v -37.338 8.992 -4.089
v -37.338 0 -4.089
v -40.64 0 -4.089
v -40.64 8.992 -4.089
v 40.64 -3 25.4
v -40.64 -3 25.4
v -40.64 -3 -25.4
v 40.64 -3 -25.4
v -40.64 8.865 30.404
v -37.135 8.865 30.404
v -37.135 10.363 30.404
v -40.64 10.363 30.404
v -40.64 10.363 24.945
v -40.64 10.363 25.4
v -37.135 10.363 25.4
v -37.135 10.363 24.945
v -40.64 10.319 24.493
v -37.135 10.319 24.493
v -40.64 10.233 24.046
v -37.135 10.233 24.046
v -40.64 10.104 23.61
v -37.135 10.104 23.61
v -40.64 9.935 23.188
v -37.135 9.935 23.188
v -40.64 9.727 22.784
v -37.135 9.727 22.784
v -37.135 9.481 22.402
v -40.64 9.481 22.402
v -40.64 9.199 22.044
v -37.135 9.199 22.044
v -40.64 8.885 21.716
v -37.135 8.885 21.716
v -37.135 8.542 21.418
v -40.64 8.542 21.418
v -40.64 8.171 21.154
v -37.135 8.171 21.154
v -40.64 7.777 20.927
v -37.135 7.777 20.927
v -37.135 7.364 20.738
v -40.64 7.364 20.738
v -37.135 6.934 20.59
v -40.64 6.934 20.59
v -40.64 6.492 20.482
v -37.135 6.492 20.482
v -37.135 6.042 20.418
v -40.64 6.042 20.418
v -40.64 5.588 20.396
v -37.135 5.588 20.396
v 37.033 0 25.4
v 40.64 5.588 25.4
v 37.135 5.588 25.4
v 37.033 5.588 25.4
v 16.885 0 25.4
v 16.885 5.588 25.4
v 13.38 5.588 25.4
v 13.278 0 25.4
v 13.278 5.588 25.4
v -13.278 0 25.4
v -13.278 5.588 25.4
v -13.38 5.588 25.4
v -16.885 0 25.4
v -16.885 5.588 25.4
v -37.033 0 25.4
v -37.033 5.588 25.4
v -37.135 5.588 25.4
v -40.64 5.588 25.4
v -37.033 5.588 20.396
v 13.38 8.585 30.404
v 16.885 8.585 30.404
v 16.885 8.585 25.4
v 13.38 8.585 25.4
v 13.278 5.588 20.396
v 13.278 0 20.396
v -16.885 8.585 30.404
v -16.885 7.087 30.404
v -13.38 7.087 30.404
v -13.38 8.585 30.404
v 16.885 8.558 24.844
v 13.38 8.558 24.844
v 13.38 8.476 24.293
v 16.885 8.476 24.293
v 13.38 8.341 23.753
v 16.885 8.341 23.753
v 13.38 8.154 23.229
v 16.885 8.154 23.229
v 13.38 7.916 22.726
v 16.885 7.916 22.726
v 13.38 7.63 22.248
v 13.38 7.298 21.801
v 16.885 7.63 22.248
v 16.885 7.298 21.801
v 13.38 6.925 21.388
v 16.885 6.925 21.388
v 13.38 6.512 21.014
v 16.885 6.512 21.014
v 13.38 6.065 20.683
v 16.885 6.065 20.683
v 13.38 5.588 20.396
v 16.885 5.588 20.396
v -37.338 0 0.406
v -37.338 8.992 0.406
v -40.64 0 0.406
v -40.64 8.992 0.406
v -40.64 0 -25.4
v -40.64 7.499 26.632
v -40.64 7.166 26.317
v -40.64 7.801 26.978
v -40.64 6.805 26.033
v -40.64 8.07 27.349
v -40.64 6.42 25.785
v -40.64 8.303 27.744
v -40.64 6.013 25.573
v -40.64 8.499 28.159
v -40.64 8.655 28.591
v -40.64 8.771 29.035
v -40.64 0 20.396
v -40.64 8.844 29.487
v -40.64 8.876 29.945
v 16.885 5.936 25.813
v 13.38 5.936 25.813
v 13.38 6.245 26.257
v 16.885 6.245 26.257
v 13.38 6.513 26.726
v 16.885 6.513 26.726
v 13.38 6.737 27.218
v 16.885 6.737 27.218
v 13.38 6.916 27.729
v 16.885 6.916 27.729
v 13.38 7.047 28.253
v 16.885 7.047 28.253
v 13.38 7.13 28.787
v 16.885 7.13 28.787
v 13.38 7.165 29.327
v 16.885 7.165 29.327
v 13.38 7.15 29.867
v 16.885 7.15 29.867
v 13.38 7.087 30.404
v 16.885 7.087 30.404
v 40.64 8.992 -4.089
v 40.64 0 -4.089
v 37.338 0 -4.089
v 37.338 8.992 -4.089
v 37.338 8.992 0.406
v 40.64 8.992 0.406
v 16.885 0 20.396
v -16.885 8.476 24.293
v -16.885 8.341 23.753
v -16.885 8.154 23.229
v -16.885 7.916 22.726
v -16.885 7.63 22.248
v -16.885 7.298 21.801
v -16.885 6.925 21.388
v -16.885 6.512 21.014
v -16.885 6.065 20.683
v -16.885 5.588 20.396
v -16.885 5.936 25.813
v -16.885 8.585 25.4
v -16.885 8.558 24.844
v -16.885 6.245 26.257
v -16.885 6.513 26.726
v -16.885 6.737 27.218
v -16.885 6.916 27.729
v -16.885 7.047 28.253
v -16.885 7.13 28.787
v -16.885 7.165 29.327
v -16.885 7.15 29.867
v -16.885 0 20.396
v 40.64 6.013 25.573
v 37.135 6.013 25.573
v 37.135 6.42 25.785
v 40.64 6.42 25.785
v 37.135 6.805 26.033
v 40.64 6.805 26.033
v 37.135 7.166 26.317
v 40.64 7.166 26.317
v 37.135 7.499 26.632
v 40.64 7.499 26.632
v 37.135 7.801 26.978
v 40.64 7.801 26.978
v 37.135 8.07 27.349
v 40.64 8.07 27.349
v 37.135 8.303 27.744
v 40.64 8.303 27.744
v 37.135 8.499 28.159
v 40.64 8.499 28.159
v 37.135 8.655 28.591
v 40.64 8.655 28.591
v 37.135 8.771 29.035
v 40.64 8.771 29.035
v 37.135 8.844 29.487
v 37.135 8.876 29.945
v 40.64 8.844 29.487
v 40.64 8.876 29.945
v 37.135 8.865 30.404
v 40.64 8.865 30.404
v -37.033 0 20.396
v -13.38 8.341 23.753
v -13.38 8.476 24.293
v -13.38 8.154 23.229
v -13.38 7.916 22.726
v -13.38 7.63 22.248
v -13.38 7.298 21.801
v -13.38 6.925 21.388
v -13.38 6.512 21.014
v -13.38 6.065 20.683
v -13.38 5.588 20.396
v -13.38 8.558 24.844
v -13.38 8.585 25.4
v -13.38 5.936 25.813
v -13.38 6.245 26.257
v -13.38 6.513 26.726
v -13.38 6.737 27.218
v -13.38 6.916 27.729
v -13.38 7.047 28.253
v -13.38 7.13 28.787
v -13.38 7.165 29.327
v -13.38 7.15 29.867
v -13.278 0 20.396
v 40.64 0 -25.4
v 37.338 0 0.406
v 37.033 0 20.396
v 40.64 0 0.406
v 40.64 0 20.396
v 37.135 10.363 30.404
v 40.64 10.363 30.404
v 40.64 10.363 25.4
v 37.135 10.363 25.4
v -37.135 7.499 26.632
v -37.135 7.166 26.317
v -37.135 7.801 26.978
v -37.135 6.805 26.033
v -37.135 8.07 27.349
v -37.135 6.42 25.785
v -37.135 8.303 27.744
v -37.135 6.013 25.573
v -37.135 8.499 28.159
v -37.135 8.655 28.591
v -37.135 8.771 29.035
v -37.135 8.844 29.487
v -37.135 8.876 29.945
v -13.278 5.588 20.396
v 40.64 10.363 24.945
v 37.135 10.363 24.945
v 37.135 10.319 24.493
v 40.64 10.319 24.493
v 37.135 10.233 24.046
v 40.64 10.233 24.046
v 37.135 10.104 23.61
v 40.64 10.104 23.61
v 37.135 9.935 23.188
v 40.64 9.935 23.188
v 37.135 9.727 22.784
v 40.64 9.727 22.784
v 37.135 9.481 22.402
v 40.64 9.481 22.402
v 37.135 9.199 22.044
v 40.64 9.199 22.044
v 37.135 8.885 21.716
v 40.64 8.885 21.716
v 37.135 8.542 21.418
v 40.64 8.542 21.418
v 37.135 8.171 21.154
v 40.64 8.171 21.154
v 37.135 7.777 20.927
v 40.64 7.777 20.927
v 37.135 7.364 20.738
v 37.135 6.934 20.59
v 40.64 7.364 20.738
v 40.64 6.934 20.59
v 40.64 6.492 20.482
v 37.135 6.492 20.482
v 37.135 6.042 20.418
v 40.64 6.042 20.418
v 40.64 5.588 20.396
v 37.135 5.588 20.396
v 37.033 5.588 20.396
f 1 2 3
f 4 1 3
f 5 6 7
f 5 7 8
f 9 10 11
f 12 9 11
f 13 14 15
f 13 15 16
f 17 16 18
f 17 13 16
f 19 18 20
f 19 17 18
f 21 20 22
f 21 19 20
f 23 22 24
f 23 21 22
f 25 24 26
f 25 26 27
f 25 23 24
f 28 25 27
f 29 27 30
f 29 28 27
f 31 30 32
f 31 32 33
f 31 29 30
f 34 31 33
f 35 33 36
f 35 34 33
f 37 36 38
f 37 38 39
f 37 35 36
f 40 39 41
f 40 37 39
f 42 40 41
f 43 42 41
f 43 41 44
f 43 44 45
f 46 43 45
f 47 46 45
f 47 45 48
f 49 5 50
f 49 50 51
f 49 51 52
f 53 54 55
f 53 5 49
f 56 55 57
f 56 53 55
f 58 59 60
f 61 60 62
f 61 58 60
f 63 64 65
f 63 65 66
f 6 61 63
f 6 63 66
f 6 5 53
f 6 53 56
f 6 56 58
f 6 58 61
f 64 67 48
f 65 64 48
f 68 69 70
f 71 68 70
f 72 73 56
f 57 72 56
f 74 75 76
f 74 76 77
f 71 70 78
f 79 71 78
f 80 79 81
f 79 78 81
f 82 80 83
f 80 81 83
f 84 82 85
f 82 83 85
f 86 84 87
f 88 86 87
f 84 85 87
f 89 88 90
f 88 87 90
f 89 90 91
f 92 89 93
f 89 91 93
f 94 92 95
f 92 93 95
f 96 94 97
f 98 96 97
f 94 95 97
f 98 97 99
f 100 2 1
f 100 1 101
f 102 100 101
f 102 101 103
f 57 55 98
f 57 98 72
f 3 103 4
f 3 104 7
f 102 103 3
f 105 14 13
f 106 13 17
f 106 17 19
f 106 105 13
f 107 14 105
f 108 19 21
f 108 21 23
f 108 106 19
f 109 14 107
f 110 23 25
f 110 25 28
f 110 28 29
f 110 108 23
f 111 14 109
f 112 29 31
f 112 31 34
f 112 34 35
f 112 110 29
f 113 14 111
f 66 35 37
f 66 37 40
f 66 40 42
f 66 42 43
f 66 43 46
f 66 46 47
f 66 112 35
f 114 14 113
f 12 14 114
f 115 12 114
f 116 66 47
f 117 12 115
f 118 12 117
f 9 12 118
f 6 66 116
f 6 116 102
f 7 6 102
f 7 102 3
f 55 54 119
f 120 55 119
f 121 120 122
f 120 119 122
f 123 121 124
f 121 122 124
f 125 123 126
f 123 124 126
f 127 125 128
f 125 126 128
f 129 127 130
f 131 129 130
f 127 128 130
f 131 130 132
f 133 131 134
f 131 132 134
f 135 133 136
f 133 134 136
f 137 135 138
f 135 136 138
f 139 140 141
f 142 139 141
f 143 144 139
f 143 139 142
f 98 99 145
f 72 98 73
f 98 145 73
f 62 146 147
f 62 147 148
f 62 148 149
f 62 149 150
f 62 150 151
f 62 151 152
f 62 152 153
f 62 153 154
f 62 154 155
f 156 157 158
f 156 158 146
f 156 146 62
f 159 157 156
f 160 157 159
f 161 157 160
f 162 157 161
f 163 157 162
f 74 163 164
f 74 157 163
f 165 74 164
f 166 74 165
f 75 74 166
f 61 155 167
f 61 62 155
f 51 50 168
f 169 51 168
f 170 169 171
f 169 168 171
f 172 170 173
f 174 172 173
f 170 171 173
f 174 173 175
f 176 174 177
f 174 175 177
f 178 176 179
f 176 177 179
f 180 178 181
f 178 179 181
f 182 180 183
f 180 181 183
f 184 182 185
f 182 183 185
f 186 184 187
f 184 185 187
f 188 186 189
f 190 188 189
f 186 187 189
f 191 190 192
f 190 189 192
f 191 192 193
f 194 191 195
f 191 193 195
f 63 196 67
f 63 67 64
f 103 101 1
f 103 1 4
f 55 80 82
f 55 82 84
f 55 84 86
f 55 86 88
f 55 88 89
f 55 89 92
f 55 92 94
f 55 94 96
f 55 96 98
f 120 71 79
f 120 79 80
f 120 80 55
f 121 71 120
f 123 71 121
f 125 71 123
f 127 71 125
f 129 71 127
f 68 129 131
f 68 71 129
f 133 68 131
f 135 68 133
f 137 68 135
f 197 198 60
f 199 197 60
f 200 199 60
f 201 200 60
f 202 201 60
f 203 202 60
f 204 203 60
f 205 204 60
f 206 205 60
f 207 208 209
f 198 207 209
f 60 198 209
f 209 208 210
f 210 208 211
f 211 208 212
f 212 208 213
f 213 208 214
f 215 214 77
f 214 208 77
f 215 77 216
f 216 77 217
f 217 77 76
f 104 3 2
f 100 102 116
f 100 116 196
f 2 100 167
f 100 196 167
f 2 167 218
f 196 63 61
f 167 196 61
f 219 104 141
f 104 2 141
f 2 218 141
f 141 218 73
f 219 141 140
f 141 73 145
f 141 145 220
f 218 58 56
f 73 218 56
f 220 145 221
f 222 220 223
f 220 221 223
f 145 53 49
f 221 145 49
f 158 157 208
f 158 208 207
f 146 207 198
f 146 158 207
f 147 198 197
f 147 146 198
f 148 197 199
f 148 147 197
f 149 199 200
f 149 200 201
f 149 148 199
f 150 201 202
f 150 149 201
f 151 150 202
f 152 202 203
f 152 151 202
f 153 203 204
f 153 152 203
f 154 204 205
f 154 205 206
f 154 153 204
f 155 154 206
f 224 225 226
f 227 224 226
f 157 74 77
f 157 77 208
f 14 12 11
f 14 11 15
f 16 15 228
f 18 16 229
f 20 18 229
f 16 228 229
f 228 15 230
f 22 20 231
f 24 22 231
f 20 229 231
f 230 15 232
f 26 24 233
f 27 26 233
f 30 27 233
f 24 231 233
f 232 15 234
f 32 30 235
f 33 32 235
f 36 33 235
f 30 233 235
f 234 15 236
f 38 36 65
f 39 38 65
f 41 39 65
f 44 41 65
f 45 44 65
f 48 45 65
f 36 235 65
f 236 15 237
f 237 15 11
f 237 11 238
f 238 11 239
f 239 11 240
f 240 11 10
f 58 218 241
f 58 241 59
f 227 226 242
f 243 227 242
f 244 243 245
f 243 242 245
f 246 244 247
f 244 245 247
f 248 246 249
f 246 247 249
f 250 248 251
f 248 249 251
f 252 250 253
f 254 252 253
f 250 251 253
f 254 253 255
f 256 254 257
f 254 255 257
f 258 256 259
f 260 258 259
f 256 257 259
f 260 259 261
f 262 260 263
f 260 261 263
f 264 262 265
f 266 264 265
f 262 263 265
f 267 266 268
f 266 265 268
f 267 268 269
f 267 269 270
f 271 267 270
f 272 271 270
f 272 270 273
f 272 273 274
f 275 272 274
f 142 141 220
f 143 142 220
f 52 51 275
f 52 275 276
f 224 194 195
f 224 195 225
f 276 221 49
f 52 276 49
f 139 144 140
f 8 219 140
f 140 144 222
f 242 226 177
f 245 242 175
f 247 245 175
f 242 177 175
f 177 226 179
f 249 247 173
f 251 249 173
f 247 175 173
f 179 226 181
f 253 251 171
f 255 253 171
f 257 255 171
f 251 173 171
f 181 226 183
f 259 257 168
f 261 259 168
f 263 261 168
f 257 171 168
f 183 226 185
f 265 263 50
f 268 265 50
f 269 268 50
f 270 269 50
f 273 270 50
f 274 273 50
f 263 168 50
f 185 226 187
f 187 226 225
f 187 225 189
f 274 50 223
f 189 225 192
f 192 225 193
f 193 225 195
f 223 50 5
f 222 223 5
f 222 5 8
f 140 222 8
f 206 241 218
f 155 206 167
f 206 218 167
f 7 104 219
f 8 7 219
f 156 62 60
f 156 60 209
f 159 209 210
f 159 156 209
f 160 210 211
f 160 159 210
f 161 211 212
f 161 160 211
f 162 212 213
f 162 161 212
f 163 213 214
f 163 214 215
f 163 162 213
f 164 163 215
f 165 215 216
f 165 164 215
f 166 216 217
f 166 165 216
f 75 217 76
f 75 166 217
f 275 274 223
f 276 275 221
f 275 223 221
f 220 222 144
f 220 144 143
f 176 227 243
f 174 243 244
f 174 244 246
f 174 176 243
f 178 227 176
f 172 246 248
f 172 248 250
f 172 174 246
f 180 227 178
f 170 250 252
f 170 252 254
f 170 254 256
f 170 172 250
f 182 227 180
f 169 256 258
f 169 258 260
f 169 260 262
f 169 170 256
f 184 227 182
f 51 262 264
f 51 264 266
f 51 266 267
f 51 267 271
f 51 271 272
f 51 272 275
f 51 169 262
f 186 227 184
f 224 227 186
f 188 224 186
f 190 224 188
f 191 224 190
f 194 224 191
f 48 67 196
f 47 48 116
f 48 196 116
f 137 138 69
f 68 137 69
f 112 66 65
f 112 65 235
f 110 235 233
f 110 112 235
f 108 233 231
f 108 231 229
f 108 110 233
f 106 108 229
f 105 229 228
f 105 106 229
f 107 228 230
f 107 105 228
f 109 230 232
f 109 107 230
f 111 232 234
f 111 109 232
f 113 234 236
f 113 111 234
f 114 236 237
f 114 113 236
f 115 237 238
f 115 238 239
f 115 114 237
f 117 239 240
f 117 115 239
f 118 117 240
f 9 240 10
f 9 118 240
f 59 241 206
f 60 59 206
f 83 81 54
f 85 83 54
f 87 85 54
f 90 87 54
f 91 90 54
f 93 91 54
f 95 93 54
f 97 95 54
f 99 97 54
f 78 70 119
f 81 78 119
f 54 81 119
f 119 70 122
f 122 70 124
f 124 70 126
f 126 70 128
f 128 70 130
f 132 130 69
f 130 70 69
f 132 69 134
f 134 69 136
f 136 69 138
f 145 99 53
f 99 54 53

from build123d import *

# Parameters (mm, degrees)
F0_W     = 81.28
F0_H     = 50.8
F1_DEPTH = 3
F2_W     = 3.6068
F2_H     = 5.0038
F3_DEPTH = 5.588
F2_W_2   = 3.302
F2_H_2   = 4.4958
F4_DEPTH = 8.9916
F6_DEPTH = 3.5052
F9_DEPTH = 3.5052


with BuildPart() as f1:
    # F0 (on Front) → F1 (new body)
    with BuildSketch(Plane.XZ):
        Rectangle(F0_W, F0_H)
    extrude(amount=F1_DEPTH)

    # F2 (on face) → F3 (join)
    with BuildSketch(Plane(origin=(0, 0, 0), x_dir=(-1, 0, 0), z_dir=(0, 1, 0))):
        with Locations((38.8366, 22.8981)):
            Rectangle(F2_W, F2_H)
        with Locations((-38.8366, 22.8981)):
            Rectangle(F2_W, F2_H)
        with Locations((-15.0818, 22.8981)):
            Rectangle(F2_W, F2_H)
        with Locations((15.0818, 22.8981)):
            Rectangle(F2_W, F2_H)
    extrude(amount=F3_DEPTH)

    # F2 (on face) → F4 (join)
    with BuildSketch(Plane(origin=(0, 0, 0), x_dir=(-1, 0, 0), z_dir=(0, 1, 0))):
        with Locations((-38.989, -1.8415)):
            Rectangle(F2_W_2, F2_H_2)
        with Locations((38.989, -1.8415)):
            Rectangle(F2_W_2, F2_H_2)
    extrude(amount=F4_DEPTH)

    # F5 (on face) → F6 (join)
    with BuildSketch(Plane(origin=(-40.64, 0, 0), x_dir=(0, -1, 0), z_dir=(-1, 0, 0))):
        with BuildLine():
            Line((-10.3632, 30.4038), (-10.3632, 25.4))
            ThreePointArc((-10.3632, 25.4), (-9.046343, 21.876274), (-5.588, 20.3962))
            Line((-5.588, 20.3962), (-5.588, 25.4))
            ThreePointArc((-5.588, 25.4), (-8.070259, 27.349257), (-8.8646, 30.4038))
            Line((-8.8646, 30.4038), (-10.3632, 30.4038))
        make_face()
    extrude(amount=-F6_DEPTH)

    # F7: F1 across plane


with BuildPart() as f1_1:
    add(f1.part)
    add(f1.part.mirror(Plane.YZ))

    # F8 (on face) → F9 (join)
    with BuildSketch(Plane(origin=(-16.8852, 0, 0), x_dir=(0, -1, 0), z_dir=(-1, 0, 0))):
        with BuildLine():
            Line((-8.5852, 30.4038), (-8.5852, 25.4))
            ThreePointArc((-8.5852, 25.4), (-7.77858, 22.483614), (-5.588, 20.3962))
            Line((-5.588, 20.3962), (-5.588, 25.4))
            ThreePointArc((-5.588, 25.4), (-6.915574, 27.728711), (-7.0866, 30.4038))
            Line((-7.0866, 30.4038), (-8.5852, 30.4038))
        make_face()
    extrude(amount=-F9_DEPTH)

    # F10: F1 across plane


with BuildPart() as f1_2:
    add(f1_1.part)
    add(f1_1.part.mirror(Plane.YZ))


solid = f1_2.part
